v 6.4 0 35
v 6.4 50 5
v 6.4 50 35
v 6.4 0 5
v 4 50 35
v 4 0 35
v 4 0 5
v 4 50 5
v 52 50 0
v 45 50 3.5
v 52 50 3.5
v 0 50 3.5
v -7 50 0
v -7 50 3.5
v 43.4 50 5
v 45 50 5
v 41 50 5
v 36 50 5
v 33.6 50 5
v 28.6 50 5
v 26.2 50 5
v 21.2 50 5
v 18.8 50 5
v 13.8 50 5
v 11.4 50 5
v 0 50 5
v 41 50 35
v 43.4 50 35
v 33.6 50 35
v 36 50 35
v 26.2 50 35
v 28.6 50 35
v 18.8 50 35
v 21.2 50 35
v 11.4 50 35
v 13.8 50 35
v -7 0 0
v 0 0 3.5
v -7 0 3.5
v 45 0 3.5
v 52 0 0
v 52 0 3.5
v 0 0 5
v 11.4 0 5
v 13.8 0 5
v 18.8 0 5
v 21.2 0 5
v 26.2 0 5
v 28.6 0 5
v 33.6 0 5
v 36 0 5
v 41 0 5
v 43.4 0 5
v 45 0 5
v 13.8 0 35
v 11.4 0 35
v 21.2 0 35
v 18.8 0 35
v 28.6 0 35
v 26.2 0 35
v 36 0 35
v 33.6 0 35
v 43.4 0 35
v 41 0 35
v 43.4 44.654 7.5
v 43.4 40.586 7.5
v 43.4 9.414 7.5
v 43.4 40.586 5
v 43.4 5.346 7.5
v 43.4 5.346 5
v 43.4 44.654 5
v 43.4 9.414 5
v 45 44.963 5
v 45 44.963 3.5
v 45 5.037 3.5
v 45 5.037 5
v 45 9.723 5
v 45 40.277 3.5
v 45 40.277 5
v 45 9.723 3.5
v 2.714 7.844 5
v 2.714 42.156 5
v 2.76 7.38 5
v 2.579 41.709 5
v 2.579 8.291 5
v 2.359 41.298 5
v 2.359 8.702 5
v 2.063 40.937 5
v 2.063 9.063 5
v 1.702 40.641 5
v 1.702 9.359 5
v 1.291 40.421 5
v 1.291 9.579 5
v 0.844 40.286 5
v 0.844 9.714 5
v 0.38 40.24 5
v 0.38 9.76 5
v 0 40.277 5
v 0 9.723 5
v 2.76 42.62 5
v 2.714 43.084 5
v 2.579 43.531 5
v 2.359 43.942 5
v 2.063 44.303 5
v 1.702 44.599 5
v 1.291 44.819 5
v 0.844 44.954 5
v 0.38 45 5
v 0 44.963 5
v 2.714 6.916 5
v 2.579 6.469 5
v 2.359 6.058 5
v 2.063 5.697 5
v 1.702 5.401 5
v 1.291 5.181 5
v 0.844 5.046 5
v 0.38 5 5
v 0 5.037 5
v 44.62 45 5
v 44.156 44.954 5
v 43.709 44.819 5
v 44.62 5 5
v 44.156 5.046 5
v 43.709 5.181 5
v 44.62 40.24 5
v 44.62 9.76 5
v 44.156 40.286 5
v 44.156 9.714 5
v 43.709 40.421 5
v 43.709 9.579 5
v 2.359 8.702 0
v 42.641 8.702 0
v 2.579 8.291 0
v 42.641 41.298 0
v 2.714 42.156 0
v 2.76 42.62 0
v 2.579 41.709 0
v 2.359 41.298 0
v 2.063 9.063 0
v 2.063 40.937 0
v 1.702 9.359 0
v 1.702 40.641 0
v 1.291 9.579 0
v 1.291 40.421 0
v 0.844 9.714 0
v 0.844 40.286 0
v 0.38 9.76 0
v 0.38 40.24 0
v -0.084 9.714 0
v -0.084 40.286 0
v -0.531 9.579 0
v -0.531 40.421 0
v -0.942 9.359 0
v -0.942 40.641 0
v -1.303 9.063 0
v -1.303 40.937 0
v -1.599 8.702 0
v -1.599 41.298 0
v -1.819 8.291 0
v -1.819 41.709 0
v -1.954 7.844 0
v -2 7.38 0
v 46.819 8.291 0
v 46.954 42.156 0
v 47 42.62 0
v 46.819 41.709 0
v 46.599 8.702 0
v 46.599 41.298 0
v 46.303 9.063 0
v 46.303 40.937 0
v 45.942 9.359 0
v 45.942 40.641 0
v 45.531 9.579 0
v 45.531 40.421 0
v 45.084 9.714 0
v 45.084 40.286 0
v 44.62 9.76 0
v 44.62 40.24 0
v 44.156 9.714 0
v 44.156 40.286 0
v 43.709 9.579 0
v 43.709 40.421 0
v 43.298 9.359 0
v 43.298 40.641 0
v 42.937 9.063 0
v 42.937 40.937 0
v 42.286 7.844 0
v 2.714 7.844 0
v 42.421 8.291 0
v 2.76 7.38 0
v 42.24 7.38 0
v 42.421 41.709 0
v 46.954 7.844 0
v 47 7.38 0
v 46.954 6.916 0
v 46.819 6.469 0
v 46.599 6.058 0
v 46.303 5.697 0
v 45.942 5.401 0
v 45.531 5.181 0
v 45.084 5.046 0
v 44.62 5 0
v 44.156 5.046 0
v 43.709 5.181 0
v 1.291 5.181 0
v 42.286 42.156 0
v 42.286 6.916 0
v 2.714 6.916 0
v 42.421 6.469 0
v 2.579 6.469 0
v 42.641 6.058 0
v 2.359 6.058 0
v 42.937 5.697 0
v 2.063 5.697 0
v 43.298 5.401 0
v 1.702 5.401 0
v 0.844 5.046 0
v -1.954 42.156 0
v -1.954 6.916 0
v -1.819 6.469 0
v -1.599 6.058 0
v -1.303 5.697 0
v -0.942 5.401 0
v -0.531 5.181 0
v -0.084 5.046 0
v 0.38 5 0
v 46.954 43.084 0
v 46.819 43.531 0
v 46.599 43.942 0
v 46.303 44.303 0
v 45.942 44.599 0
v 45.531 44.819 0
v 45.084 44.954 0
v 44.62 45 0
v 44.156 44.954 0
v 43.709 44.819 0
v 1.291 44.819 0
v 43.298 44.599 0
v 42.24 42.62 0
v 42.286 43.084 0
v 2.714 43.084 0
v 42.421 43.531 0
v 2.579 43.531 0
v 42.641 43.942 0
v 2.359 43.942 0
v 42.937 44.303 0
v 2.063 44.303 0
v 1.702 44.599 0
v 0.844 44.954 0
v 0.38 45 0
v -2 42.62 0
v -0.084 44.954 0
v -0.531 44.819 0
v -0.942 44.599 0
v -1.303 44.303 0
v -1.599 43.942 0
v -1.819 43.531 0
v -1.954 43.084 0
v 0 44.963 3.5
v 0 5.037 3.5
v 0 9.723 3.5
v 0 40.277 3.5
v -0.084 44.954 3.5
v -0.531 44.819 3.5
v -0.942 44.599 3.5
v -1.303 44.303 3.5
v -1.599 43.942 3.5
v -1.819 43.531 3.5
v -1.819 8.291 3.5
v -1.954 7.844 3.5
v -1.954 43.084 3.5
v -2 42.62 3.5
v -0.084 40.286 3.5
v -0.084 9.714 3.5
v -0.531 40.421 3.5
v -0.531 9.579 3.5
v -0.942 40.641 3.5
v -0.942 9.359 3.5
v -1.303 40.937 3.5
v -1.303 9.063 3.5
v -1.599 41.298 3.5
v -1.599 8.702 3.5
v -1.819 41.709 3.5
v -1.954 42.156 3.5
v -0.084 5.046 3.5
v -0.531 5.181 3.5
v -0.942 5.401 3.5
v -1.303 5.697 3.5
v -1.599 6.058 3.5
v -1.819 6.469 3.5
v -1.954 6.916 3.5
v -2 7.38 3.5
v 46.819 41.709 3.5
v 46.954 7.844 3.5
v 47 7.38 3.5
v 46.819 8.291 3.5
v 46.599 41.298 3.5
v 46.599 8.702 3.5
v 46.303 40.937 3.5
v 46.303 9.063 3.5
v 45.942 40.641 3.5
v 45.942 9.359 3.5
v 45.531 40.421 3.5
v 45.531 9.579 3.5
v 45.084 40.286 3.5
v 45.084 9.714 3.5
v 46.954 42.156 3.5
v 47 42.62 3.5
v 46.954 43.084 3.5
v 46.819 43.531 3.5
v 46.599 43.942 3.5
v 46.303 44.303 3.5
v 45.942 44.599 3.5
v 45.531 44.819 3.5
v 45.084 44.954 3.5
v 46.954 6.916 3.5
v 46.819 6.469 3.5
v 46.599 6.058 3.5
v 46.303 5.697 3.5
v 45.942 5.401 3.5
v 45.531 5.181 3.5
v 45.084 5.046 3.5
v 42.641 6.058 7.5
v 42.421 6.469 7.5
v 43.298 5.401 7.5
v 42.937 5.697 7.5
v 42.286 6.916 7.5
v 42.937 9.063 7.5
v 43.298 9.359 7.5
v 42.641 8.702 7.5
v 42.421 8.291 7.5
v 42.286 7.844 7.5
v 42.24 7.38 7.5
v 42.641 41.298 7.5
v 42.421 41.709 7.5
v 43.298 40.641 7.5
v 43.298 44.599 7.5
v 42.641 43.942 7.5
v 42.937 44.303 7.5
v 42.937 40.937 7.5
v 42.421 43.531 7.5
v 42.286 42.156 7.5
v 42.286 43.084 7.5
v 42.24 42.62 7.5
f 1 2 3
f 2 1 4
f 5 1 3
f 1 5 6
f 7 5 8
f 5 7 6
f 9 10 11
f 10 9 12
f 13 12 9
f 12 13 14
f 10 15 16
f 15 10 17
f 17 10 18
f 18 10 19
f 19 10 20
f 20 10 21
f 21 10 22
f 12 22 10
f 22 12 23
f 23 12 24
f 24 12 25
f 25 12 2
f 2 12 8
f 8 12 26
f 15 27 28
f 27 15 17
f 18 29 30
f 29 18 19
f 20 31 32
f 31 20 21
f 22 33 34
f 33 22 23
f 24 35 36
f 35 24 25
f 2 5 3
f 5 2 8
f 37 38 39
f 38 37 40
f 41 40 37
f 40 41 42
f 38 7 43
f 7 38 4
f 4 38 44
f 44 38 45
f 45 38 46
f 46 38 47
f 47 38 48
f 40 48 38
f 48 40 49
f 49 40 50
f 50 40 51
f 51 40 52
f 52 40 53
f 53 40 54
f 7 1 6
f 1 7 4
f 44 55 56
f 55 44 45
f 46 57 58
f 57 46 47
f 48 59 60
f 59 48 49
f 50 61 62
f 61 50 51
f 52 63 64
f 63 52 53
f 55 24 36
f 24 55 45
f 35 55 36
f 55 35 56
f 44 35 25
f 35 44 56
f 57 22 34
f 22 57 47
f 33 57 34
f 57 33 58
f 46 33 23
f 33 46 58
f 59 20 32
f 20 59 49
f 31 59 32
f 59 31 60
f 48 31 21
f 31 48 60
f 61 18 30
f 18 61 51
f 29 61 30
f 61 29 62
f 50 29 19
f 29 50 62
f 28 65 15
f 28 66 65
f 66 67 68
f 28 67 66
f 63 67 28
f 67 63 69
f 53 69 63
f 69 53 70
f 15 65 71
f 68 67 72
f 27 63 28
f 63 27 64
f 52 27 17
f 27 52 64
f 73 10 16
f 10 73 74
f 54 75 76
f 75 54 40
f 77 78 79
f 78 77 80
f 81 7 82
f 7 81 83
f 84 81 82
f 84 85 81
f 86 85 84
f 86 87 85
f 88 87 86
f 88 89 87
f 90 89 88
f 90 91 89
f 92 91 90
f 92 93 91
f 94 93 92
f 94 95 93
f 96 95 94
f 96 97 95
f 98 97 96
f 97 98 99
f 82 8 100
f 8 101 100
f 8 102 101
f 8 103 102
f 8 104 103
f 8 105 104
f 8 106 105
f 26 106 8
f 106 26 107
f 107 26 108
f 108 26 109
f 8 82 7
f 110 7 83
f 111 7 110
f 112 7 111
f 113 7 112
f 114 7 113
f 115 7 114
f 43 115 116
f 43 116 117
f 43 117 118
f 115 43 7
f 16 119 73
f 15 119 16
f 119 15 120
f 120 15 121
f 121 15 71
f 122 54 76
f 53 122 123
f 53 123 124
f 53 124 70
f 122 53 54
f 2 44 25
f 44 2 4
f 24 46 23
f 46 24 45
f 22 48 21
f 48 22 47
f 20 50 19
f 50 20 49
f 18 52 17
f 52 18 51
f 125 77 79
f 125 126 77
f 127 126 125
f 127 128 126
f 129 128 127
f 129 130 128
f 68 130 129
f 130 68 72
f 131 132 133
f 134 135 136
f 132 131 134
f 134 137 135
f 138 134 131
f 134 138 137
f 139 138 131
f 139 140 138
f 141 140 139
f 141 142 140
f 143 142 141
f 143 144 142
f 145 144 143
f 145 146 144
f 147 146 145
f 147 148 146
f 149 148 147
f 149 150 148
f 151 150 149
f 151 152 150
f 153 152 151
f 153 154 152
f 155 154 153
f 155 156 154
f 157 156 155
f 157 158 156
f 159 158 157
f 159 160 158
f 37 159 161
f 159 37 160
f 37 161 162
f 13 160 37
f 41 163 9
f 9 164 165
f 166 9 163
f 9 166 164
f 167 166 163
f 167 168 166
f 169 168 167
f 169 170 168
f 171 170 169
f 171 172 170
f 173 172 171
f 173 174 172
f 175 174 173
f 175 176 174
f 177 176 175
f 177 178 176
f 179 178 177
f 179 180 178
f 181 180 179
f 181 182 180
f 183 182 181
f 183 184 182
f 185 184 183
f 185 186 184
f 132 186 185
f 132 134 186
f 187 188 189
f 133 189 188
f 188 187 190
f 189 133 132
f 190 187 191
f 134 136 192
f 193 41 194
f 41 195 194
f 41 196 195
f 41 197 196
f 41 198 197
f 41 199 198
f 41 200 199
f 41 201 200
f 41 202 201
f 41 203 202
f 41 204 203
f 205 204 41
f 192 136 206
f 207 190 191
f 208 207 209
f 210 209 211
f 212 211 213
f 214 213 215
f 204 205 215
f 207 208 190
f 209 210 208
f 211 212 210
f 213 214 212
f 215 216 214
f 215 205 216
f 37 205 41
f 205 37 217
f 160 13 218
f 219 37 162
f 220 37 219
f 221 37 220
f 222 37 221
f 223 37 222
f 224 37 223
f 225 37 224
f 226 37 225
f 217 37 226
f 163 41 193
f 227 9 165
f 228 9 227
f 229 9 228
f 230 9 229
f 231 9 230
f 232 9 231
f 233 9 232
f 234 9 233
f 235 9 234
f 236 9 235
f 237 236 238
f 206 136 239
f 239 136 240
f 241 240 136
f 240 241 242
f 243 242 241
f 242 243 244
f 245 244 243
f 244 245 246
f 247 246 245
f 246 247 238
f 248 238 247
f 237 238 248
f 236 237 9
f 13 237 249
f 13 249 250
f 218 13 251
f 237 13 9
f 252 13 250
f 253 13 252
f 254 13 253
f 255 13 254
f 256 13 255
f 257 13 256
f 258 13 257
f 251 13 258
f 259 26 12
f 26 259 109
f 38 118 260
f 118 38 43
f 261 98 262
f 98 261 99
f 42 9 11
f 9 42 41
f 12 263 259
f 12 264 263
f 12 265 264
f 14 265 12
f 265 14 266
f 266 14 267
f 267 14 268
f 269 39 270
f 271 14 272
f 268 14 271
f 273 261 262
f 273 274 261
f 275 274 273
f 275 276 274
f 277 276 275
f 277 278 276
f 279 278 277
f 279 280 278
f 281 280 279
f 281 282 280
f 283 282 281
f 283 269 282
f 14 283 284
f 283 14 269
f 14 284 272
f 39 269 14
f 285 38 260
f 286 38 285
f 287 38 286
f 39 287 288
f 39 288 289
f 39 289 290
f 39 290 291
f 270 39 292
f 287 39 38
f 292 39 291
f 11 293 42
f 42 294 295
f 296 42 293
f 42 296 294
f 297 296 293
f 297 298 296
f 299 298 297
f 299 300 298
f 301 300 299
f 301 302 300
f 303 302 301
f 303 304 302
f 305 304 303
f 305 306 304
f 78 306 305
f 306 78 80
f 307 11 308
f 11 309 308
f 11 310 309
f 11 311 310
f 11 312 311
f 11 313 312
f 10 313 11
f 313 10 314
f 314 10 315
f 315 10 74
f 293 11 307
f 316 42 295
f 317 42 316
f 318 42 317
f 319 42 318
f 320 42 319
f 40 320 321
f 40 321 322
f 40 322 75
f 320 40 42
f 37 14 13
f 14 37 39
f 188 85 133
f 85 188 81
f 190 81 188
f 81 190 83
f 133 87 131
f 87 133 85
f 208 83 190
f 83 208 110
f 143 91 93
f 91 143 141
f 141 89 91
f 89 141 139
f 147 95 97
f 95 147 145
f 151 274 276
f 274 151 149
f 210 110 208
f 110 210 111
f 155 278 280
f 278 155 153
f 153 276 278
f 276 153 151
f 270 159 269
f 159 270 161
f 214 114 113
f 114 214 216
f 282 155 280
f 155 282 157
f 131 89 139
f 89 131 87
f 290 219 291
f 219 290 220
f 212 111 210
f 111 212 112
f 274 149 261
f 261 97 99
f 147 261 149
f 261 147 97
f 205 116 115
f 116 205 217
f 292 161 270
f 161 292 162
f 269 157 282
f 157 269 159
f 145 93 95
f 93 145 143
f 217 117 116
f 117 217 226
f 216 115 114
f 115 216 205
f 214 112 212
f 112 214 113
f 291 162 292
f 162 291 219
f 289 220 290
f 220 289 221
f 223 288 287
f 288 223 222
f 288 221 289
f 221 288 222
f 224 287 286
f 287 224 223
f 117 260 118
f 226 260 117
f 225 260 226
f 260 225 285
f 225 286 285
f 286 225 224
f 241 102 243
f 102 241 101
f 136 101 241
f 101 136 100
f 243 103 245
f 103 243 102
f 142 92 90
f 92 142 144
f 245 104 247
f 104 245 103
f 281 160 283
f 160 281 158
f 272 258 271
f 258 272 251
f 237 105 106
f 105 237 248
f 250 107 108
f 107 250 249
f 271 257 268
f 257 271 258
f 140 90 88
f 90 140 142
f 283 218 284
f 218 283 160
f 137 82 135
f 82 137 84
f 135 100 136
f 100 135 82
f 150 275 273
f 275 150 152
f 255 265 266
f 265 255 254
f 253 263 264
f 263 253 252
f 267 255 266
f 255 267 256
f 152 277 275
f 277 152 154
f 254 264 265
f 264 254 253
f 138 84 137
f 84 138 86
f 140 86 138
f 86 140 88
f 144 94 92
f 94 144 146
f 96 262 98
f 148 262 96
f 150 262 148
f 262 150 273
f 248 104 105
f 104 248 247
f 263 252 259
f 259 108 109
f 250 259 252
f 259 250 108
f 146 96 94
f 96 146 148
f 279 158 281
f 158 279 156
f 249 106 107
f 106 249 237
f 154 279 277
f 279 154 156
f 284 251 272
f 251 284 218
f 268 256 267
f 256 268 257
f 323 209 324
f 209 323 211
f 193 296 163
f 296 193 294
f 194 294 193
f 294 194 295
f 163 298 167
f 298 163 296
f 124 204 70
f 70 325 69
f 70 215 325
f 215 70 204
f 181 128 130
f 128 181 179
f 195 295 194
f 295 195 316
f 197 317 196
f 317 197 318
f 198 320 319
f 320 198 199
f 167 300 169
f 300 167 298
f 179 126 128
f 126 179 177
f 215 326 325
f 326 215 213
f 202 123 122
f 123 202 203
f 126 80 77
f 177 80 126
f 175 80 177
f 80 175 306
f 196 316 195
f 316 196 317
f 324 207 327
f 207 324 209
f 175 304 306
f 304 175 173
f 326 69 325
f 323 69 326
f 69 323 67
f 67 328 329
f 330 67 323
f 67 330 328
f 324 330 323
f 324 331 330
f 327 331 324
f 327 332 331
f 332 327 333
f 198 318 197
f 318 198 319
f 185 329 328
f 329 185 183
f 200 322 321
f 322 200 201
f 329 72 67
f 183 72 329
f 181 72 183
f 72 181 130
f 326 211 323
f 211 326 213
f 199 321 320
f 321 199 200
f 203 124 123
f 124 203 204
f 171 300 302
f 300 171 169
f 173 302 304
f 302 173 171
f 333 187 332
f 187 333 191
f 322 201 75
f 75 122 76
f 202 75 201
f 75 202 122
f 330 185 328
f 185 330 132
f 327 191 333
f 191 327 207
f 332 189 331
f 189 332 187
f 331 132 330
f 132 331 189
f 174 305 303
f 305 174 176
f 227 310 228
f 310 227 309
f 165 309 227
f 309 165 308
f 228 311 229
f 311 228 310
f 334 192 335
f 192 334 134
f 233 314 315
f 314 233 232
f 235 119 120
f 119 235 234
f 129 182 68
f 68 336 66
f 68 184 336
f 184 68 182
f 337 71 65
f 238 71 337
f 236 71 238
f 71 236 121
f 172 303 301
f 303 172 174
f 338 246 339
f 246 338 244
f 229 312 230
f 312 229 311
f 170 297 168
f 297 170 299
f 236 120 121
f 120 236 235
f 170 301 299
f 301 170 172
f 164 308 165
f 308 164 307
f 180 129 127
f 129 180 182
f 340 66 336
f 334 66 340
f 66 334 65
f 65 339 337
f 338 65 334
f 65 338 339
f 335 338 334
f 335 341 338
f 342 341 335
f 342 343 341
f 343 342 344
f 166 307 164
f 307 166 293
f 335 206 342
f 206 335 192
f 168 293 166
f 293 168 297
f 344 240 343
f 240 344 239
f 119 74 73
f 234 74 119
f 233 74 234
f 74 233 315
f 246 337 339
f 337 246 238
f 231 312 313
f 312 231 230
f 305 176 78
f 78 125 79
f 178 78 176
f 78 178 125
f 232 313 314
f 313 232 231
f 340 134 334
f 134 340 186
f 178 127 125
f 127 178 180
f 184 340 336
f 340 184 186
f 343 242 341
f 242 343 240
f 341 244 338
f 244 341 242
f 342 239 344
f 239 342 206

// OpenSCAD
$fn = 32;

// ----------------------------------------------------------------------
// Finned heat sink: 45 x 50 mm base, 30 mm fins
// ----------------------------------------------------------------------

// --- parameters (mm) ---
base_w = 45;              // base width
base_d = 50;              // base depth
base_t = 5;               // base thickness
fin_h = 30;               // fin height above the base
holes_d = 4.76;           // fixing holes
hole_x = 22.12;           // hole offset in x
hole_y = 17.62;           // hole offset in y
fin_t = 2.4;              // fin thickness
fin_pitch = 7.4;          // fin pitch
fin_count = 6;            // number of fins
fin_x0 = 4;               // first fin offset
flange_w = 59;            // flange plate width
flange_t = 3;             // flange plate thickness

difference() {
  union() {
    cube([base_w, base_d, base_t]);
    for (i = [0 : fin_count - 1]) {
      translate([fin_x0 + i * fin_pitch, 0, base_t - 0.5]) cube([fin_t, base_d, fin_h + 0.5]);
    }
    /* mounting flange, a wider plate sharing the base bottom */
    translate([(base_w - flange_w) / 2, 0, 0]) cube([flange_w, base_d, flange_t + 0.5]);
  }
  /* fixing holes through the base, 2.5 mm clear on both sides */
  for (hx = [-22.12, 22.12]) {
    for (hy = [-17.62, 17.62]) {
      translate([base_w / 2 + hx, base_d / 2 + hy, -2.5]) cylinder(h = base_t + 5, d = holes_d);
    }
  }
}
